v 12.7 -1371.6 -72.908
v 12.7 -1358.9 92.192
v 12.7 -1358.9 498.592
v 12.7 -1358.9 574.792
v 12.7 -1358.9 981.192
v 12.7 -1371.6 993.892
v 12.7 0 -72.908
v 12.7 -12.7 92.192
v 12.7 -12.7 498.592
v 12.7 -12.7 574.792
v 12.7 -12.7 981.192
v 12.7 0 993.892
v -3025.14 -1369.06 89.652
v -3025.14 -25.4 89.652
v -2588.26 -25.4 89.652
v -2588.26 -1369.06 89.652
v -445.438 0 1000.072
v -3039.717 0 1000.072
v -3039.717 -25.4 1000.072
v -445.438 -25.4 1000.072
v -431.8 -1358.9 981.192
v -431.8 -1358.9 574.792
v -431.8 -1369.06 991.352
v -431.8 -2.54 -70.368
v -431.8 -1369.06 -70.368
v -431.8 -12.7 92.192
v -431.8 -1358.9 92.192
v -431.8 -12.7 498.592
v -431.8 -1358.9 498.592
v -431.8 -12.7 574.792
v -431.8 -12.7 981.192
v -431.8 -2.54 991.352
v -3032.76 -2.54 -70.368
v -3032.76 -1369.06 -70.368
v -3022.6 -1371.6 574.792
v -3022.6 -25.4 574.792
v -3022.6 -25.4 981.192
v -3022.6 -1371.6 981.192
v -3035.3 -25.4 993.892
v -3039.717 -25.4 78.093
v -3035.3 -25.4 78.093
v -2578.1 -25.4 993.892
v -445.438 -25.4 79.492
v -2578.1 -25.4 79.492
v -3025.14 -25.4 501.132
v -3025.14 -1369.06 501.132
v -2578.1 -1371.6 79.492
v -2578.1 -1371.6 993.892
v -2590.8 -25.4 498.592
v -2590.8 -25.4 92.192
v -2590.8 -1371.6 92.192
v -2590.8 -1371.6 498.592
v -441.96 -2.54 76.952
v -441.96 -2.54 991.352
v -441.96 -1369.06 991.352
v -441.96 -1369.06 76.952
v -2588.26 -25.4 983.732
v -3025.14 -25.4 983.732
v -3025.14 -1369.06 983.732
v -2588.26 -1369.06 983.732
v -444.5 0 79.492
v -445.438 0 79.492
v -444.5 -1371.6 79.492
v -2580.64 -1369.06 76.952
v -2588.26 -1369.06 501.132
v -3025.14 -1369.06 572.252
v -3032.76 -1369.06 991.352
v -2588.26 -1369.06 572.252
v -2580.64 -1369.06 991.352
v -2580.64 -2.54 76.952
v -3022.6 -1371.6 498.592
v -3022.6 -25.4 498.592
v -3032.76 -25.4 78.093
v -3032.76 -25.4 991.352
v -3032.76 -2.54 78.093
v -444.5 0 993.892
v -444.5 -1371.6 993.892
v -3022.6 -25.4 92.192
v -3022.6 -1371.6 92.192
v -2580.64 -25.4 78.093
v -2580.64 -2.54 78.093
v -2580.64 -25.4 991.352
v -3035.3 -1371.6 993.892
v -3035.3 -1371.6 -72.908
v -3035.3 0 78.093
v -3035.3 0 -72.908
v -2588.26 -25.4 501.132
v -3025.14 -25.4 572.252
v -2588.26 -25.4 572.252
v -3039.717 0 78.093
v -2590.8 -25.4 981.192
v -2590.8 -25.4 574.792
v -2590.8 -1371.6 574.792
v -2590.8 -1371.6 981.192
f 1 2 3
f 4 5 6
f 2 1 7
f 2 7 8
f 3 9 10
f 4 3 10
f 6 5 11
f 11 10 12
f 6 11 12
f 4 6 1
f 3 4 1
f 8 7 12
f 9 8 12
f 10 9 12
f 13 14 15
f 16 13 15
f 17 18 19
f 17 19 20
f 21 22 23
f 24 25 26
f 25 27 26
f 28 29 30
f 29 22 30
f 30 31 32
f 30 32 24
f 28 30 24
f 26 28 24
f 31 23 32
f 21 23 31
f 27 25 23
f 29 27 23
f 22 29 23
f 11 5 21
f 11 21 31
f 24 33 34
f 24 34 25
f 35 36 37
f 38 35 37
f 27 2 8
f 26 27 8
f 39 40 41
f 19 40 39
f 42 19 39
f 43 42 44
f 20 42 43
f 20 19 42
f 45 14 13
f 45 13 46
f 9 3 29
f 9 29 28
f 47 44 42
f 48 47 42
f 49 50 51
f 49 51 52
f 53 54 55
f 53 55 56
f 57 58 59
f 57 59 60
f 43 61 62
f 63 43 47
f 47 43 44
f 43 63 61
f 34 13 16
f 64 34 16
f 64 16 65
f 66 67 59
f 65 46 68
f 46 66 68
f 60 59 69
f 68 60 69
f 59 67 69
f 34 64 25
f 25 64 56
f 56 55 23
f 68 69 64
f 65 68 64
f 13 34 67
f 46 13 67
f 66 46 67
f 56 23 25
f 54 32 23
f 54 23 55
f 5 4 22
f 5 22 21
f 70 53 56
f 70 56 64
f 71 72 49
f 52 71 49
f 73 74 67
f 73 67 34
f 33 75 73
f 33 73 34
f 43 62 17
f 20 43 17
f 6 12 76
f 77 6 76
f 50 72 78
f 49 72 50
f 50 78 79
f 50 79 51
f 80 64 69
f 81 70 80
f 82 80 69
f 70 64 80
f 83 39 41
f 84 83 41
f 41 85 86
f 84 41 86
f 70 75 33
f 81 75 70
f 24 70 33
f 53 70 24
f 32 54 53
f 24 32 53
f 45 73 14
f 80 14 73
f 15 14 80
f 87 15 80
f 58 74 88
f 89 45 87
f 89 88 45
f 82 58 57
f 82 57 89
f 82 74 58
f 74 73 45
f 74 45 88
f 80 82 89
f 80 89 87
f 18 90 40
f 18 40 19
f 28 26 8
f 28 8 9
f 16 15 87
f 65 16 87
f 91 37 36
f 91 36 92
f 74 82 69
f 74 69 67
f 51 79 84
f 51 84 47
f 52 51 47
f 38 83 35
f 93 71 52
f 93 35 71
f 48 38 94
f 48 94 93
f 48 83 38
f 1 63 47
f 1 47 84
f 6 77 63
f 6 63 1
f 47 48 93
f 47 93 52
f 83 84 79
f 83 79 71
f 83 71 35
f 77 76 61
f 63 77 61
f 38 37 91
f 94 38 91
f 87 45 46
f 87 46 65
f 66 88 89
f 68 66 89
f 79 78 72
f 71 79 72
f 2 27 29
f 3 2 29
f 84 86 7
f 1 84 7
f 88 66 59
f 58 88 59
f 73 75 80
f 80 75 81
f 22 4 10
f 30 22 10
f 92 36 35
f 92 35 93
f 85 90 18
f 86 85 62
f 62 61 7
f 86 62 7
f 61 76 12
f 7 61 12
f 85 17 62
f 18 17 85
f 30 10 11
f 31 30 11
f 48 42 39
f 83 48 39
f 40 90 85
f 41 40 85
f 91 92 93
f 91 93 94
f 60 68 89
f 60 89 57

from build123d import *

# Parameters (mm, degrees)
F0_W     = 431.8
F0_H     = 406.4
F1_DEPTH = 1371.6
F3_T     = -2.54
F2_W     = 1371.6
F2_H     = 1066.8
F2_W_2   = 1346.2
F2_H_2   = 406.4
F4_DEPTH = 444.5
F5_W     = 2594.2790210247
F5_H     = 921.9796732068
F6_DEPTH = 25.4


with BuildPart() as f1:
    # F0 (on Front) → F1 (new body)
    with BuildSketch(Plane.XZ):
        Polygon((-444.5, 79.4924489021), (-2578.1, 79.4924489021), (-2578.1, 993.8924489021), (-3035.3, 993.8924489021), (-3035.3, 79.4924489021), (-3035.3, -72.9075510979), (12.7, -72.9075510979), (12.7, 79.4924489021), (12.7, 993.8924489021), (-444.5, 993.8924489021), align=None)
        with Locations((-2806.7, 295.3924489021)):
            Rectangle(F0_W, F0_H, mode=Mode.SUBTRACT)
        with Locations((-2806.7, 777.9924489021)):
            Rectangle(F0_W, F0_H, mode=Mode.SUBTRACT)
    extrude(amount=F1_DEPTH)

    # F3
    f3_openings = [f1.faces().sort_by_distance(p)[0] for p in [
        (12.7, -685.8, 460.492449),
    ]]
    offset(amount=F3_T, openings=f3_openings, kind=Kind.INTERSECTION)

    # F2 (on face) → F4 (join)
    with BuildSketch(Plane.YZ.offset(12.7)):
        with Locations((-685.8, 460.4924489021)):
            Rectangle(F2_W, F2_H)
        with Locations((-685.8, 295.3924489021)):
            Rectangle(F2_W_2, F2_H_2, mode=Mode.SUBTRACT)
        with Locations((-685.8, 777.9924489021)):
            Rectangle(F2_W_2, F2_H_2, mode=Mode.SUBTRACT)
    extrude(amount=-F4_DEPTH)

    # F5 (on Front) → F6 (join)
    with BuildSketch(Plane.XZ):
        with Locations((-1742.5772100687, 539.0826426446)):
            Rectangle(F5_W, F5_H)
    extrude(amount=F6_DEPTH)


solid = f1.part
